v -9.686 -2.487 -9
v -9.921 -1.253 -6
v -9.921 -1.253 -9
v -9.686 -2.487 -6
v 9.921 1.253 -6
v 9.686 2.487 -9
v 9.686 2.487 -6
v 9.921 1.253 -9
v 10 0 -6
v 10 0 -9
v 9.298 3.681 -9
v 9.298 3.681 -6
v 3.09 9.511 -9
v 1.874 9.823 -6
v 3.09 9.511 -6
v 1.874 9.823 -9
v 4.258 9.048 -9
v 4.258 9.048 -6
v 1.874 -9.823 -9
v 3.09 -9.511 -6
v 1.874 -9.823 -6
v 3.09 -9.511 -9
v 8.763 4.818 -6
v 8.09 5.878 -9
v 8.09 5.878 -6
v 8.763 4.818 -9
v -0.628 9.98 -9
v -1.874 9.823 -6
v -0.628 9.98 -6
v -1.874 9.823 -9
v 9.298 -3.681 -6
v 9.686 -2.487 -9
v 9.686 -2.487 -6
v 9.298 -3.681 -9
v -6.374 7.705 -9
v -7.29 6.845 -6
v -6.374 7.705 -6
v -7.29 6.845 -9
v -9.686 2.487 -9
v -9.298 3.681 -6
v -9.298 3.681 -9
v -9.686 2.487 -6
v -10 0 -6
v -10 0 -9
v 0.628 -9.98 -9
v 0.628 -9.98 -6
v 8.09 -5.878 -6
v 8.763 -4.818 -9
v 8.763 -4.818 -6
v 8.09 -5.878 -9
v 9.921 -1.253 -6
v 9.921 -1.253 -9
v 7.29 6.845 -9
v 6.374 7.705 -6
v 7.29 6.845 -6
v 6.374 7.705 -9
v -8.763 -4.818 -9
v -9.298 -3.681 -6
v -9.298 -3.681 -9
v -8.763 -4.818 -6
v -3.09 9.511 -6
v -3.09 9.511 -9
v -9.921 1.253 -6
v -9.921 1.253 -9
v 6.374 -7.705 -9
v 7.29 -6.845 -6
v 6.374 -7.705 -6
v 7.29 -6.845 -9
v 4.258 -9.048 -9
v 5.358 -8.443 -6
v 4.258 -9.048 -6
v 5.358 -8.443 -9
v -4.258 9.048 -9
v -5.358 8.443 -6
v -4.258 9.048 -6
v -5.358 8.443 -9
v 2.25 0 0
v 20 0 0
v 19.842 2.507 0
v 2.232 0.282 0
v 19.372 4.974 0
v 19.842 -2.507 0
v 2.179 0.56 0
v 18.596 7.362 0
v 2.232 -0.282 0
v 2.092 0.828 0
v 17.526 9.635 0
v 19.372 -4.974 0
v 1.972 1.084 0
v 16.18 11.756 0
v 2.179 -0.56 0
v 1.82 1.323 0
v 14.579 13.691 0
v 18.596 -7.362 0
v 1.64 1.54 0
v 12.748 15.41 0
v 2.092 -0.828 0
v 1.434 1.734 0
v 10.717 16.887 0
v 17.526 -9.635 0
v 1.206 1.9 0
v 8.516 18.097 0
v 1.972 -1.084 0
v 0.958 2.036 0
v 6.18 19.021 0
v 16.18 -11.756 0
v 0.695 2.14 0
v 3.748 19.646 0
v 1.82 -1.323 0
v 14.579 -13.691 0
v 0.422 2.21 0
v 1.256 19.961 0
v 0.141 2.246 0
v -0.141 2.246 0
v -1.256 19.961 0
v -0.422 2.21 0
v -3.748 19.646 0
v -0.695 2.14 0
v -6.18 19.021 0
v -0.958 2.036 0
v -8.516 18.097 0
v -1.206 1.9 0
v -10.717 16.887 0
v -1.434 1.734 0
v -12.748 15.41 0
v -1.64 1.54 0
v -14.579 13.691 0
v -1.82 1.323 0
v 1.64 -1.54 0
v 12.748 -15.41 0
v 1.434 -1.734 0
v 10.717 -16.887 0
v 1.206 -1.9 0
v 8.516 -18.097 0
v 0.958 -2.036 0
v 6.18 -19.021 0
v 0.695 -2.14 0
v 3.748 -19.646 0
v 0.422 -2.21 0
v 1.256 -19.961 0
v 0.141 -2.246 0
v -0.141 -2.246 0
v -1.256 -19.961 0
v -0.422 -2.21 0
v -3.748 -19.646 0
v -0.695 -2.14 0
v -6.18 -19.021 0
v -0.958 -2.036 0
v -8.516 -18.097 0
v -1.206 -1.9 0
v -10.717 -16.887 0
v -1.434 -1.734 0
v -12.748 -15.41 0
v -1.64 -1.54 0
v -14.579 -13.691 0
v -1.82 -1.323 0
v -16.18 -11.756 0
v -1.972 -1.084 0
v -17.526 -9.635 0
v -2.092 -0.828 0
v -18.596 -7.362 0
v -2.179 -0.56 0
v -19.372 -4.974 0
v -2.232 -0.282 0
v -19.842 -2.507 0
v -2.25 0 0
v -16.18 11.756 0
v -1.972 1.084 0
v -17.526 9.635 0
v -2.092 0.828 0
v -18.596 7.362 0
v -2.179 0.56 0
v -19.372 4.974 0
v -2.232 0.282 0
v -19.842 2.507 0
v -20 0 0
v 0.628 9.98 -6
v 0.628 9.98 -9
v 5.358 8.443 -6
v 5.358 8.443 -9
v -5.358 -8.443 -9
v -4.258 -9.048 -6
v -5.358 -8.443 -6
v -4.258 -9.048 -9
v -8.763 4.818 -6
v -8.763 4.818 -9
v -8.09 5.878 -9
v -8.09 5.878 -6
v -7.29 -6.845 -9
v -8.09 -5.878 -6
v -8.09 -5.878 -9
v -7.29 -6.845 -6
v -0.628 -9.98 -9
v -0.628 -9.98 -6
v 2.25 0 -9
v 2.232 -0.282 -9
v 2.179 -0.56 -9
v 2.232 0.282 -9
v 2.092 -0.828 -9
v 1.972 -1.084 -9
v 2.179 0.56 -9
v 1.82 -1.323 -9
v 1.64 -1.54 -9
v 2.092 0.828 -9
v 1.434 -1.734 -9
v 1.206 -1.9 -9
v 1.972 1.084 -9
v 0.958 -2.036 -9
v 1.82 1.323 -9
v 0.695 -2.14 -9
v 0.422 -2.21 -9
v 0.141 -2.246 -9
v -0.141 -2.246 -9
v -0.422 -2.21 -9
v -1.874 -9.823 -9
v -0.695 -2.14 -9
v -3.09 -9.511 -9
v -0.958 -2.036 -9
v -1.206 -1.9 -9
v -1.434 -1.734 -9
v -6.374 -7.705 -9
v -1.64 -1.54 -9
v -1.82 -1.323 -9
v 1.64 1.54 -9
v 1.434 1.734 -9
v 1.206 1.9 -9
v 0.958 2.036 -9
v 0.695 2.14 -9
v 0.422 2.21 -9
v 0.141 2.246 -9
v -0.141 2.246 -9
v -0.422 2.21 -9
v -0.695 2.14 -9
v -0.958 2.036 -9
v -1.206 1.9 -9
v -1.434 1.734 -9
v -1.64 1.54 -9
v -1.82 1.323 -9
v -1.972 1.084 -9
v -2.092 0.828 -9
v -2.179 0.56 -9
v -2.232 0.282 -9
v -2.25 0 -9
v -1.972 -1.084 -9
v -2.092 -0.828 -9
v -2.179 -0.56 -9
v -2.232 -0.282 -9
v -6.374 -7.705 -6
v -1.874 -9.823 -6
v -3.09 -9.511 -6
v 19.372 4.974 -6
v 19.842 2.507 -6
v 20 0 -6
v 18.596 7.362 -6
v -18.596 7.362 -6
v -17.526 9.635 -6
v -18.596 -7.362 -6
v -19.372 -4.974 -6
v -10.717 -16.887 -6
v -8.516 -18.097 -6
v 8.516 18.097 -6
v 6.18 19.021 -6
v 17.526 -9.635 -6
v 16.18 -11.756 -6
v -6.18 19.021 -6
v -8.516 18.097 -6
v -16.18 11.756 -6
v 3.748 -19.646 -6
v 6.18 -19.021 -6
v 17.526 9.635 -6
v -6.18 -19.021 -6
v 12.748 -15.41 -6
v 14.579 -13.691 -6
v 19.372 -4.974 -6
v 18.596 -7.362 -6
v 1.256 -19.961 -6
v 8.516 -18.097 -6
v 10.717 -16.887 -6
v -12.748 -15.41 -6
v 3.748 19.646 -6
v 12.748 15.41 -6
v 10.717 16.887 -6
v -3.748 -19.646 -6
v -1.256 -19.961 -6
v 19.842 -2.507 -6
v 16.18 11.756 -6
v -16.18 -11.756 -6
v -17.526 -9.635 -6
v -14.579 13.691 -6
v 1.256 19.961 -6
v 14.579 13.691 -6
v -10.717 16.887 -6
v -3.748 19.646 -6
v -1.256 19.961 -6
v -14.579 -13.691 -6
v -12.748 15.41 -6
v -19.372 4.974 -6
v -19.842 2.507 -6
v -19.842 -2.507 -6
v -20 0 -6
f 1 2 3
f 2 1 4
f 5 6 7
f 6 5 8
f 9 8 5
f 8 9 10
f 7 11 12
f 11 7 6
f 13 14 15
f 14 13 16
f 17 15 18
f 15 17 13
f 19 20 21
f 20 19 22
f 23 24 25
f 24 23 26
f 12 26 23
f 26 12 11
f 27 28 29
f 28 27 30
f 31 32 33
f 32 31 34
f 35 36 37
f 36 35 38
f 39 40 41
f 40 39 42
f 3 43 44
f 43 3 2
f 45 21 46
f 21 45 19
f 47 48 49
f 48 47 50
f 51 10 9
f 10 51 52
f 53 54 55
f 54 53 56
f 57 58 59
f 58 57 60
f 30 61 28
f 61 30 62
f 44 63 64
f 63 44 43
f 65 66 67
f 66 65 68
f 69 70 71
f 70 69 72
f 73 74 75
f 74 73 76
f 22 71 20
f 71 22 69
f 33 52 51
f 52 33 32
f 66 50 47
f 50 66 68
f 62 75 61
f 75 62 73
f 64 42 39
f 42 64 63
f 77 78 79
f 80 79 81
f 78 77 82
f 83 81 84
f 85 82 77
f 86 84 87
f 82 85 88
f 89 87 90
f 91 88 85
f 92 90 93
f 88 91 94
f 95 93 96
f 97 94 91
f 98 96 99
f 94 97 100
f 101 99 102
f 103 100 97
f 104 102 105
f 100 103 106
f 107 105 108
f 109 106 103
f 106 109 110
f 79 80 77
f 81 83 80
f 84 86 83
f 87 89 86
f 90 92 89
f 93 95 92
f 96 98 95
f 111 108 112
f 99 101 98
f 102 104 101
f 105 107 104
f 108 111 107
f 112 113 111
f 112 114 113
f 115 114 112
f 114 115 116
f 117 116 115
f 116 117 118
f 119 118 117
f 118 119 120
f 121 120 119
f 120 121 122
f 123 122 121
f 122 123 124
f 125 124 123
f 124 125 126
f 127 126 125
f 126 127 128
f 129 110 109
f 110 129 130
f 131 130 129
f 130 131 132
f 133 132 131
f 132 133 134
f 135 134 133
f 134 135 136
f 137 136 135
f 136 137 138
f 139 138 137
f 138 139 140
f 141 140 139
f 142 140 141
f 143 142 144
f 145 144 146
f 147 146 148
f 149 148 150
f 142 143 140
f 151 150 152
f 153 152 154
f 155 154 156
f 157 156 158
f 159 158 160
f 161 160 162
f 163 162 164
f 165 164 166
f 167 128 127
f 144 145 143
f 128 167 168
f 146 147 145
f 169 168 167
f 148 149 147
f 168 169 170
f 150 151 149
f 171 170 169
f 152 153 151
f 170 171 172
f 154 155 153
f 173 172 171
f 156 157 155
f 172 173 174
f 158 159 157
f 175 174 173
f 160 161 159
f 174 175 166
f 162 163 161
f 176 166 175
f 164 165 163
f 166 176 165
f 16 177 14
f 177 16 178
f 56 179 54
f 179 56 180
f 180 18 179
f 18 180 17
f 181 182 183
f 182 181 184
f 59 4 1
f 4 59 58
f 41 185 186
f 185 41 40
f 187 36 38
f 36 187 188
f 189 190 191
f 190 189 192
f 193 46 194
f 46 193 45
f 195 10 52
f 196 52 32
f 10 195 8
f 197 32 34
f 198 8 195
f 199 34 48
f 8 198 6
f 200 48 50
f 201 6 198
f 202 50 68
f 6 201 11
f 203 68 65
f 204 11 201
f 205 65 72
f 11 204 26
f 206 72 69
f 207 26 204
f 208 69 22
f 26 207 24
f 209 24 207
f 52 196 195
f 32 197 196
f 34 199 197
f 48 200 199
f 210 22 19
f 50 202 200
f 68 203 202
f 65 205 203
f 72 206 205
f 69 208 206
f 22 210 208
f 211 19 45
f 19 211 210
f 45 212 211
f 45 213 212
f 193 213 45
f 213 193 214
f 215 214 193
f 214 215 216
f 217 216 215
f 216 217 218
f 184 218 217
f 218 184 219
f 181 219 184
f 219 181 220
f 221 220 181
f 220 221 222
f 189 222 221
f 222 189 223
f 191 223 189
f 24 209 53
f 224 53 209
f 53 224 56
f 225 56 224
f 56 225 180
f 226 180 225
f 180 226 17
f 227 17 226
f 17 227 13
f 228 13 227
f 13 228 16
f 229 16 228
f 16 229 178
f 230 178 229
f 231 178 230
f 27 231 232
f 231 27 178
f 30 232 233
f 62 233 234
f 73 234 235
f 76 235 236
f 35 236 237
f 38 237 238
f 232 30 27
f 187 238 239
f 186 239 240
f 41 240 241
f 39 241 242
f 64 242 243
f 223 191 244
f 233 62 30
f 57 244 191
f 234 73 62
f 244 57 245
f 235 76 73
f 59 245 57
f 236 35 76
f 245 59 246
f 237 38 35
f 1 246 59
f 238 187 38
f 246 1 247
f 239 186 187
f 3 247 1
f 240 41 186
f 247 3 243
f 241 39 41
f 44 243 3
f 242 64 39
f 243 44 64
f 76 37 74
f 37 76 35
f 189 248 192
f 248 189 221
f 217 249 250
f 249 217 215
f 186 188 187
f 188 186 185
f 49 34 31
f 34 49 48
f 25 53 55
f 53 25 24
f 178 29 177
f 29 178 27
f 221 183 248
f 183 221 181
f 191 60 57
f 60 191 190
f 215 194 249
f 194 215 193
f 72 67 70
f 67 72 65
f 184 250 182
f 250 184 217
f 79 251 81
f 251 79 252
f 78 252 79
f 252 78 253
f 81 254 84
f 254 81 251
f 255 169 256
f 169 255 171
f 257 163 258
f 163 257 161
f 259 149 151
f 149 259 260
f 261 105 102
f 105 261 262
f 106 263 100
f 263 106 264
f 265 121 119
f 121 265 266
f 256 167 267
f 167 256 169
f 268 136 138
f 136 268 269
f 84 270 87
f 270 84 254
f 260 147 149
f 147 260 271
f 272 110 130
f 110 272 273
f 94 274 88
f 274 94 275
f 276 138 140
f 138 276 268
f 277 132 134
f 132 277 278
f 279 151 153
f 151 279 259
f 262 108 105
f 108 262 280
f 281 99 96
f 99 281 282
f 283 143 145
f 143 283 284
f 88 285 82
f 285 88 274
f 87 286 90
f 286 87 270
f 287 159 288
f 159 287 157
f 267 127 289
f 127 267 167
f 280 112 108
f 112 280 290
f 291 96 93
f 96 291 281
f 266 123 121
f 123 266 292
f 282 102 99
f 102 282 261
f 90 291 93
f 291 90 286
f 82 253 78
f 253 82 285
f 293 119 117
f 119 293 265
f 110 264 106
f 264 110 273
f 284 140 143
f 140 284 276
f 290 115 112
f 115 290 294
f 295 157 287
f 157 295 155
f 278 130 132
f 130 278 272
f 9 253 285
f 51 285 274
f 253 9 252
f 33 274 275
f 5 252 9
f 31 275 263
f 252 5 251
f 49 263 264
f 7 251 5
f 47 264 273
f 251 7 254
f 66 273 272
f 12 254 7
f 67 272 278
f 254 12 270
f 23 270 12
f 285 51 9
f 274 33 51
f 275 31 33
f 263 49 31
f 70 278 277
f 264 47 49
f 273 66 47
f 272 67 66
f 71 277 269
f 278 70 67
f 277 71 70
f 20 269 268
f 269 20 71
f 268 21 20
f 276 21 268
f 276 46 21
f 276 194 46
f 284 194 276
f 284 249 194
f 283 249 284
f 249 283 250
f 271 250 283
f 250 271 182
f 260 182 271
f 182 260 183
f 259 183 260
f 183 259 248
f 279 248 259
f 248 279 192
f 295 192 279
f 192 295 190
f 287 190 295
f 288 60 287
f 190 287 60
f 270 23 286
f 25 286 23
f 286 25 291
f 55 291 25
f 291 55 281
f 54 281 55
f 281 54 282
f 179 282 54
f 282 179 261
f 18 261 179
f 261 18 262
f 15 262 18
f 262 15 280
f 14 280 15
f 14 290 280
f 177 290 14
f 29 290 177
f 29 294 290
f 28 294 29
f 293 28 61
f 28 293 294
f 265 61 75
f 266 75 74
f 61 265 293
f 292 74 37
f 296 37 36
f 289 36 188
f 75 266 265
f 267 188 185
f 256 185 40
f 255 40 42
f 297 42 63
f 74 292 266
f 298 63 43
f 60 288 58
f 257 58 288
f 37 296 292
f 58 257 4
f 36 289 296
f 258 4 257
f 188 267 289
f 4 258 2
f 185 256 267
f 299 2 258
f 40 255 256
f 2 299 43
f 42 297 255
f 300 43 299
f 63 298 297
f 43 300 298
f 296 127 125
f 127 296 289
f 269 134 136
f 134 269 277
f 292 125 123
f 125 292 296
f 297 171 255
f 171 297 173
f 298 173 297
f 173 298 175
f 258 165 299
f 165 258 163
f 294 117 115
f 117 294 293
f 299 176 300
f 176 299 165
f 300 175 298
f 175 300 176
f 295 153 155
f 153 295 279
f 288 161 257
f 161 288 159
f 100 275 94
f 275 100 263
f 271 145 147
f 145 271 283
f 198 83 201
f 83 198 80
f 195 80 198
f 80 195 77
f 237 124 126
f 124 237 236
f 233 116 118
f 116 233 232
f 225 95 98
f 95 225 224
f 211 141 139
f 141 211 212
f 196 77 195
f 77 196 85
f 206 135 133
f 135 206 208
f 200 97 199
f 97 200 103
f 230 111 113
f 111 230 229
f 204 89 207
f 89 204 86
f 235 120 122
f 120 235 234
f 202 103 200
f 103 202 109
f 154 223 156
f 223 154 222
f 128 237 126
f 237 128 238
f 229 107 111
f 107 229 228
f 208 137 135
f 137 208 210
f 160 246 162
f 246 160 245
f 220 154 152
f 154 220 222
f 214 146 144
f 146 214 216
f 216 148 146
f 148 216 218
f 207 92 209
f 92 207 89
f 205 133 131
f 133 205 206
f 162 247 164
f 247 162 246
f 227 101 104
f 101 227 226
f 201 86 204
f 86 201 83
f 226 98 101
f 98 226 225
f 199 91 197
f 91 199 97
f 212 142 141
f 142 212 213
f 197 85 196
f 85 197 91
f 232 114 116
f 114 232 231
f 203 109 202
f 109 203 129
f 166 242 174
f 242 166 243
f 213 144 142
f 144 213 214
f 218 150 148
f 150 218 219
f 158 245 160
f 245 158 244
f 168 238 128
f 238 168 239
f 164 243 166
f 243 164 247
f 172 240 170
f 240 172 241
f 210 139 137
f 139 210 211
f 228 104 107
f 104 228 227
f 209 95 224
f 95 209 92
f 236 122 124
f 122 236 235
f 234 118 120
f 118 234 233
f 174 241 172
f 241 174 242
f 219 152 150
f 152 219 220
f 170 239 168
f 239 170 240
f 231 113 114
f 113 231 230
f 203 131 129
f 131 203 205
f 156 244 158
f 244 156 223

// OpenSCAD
$fn = 50;


difference() {
	union() {
		translate(v = [0, 0, -9.0000000000]) {
			cylinder(h = 9, r = 10.0000000000);
		}
		translate(v = [0, 0, -6.0000000000]) {
			cylinder(h = 6, r = 20.0000000000);
		}
	}
	union() {
		#translate(v = [0, 0, -9]) {
			cylinder(h = 9, r = 2.2500000000);
		}
	}
}
